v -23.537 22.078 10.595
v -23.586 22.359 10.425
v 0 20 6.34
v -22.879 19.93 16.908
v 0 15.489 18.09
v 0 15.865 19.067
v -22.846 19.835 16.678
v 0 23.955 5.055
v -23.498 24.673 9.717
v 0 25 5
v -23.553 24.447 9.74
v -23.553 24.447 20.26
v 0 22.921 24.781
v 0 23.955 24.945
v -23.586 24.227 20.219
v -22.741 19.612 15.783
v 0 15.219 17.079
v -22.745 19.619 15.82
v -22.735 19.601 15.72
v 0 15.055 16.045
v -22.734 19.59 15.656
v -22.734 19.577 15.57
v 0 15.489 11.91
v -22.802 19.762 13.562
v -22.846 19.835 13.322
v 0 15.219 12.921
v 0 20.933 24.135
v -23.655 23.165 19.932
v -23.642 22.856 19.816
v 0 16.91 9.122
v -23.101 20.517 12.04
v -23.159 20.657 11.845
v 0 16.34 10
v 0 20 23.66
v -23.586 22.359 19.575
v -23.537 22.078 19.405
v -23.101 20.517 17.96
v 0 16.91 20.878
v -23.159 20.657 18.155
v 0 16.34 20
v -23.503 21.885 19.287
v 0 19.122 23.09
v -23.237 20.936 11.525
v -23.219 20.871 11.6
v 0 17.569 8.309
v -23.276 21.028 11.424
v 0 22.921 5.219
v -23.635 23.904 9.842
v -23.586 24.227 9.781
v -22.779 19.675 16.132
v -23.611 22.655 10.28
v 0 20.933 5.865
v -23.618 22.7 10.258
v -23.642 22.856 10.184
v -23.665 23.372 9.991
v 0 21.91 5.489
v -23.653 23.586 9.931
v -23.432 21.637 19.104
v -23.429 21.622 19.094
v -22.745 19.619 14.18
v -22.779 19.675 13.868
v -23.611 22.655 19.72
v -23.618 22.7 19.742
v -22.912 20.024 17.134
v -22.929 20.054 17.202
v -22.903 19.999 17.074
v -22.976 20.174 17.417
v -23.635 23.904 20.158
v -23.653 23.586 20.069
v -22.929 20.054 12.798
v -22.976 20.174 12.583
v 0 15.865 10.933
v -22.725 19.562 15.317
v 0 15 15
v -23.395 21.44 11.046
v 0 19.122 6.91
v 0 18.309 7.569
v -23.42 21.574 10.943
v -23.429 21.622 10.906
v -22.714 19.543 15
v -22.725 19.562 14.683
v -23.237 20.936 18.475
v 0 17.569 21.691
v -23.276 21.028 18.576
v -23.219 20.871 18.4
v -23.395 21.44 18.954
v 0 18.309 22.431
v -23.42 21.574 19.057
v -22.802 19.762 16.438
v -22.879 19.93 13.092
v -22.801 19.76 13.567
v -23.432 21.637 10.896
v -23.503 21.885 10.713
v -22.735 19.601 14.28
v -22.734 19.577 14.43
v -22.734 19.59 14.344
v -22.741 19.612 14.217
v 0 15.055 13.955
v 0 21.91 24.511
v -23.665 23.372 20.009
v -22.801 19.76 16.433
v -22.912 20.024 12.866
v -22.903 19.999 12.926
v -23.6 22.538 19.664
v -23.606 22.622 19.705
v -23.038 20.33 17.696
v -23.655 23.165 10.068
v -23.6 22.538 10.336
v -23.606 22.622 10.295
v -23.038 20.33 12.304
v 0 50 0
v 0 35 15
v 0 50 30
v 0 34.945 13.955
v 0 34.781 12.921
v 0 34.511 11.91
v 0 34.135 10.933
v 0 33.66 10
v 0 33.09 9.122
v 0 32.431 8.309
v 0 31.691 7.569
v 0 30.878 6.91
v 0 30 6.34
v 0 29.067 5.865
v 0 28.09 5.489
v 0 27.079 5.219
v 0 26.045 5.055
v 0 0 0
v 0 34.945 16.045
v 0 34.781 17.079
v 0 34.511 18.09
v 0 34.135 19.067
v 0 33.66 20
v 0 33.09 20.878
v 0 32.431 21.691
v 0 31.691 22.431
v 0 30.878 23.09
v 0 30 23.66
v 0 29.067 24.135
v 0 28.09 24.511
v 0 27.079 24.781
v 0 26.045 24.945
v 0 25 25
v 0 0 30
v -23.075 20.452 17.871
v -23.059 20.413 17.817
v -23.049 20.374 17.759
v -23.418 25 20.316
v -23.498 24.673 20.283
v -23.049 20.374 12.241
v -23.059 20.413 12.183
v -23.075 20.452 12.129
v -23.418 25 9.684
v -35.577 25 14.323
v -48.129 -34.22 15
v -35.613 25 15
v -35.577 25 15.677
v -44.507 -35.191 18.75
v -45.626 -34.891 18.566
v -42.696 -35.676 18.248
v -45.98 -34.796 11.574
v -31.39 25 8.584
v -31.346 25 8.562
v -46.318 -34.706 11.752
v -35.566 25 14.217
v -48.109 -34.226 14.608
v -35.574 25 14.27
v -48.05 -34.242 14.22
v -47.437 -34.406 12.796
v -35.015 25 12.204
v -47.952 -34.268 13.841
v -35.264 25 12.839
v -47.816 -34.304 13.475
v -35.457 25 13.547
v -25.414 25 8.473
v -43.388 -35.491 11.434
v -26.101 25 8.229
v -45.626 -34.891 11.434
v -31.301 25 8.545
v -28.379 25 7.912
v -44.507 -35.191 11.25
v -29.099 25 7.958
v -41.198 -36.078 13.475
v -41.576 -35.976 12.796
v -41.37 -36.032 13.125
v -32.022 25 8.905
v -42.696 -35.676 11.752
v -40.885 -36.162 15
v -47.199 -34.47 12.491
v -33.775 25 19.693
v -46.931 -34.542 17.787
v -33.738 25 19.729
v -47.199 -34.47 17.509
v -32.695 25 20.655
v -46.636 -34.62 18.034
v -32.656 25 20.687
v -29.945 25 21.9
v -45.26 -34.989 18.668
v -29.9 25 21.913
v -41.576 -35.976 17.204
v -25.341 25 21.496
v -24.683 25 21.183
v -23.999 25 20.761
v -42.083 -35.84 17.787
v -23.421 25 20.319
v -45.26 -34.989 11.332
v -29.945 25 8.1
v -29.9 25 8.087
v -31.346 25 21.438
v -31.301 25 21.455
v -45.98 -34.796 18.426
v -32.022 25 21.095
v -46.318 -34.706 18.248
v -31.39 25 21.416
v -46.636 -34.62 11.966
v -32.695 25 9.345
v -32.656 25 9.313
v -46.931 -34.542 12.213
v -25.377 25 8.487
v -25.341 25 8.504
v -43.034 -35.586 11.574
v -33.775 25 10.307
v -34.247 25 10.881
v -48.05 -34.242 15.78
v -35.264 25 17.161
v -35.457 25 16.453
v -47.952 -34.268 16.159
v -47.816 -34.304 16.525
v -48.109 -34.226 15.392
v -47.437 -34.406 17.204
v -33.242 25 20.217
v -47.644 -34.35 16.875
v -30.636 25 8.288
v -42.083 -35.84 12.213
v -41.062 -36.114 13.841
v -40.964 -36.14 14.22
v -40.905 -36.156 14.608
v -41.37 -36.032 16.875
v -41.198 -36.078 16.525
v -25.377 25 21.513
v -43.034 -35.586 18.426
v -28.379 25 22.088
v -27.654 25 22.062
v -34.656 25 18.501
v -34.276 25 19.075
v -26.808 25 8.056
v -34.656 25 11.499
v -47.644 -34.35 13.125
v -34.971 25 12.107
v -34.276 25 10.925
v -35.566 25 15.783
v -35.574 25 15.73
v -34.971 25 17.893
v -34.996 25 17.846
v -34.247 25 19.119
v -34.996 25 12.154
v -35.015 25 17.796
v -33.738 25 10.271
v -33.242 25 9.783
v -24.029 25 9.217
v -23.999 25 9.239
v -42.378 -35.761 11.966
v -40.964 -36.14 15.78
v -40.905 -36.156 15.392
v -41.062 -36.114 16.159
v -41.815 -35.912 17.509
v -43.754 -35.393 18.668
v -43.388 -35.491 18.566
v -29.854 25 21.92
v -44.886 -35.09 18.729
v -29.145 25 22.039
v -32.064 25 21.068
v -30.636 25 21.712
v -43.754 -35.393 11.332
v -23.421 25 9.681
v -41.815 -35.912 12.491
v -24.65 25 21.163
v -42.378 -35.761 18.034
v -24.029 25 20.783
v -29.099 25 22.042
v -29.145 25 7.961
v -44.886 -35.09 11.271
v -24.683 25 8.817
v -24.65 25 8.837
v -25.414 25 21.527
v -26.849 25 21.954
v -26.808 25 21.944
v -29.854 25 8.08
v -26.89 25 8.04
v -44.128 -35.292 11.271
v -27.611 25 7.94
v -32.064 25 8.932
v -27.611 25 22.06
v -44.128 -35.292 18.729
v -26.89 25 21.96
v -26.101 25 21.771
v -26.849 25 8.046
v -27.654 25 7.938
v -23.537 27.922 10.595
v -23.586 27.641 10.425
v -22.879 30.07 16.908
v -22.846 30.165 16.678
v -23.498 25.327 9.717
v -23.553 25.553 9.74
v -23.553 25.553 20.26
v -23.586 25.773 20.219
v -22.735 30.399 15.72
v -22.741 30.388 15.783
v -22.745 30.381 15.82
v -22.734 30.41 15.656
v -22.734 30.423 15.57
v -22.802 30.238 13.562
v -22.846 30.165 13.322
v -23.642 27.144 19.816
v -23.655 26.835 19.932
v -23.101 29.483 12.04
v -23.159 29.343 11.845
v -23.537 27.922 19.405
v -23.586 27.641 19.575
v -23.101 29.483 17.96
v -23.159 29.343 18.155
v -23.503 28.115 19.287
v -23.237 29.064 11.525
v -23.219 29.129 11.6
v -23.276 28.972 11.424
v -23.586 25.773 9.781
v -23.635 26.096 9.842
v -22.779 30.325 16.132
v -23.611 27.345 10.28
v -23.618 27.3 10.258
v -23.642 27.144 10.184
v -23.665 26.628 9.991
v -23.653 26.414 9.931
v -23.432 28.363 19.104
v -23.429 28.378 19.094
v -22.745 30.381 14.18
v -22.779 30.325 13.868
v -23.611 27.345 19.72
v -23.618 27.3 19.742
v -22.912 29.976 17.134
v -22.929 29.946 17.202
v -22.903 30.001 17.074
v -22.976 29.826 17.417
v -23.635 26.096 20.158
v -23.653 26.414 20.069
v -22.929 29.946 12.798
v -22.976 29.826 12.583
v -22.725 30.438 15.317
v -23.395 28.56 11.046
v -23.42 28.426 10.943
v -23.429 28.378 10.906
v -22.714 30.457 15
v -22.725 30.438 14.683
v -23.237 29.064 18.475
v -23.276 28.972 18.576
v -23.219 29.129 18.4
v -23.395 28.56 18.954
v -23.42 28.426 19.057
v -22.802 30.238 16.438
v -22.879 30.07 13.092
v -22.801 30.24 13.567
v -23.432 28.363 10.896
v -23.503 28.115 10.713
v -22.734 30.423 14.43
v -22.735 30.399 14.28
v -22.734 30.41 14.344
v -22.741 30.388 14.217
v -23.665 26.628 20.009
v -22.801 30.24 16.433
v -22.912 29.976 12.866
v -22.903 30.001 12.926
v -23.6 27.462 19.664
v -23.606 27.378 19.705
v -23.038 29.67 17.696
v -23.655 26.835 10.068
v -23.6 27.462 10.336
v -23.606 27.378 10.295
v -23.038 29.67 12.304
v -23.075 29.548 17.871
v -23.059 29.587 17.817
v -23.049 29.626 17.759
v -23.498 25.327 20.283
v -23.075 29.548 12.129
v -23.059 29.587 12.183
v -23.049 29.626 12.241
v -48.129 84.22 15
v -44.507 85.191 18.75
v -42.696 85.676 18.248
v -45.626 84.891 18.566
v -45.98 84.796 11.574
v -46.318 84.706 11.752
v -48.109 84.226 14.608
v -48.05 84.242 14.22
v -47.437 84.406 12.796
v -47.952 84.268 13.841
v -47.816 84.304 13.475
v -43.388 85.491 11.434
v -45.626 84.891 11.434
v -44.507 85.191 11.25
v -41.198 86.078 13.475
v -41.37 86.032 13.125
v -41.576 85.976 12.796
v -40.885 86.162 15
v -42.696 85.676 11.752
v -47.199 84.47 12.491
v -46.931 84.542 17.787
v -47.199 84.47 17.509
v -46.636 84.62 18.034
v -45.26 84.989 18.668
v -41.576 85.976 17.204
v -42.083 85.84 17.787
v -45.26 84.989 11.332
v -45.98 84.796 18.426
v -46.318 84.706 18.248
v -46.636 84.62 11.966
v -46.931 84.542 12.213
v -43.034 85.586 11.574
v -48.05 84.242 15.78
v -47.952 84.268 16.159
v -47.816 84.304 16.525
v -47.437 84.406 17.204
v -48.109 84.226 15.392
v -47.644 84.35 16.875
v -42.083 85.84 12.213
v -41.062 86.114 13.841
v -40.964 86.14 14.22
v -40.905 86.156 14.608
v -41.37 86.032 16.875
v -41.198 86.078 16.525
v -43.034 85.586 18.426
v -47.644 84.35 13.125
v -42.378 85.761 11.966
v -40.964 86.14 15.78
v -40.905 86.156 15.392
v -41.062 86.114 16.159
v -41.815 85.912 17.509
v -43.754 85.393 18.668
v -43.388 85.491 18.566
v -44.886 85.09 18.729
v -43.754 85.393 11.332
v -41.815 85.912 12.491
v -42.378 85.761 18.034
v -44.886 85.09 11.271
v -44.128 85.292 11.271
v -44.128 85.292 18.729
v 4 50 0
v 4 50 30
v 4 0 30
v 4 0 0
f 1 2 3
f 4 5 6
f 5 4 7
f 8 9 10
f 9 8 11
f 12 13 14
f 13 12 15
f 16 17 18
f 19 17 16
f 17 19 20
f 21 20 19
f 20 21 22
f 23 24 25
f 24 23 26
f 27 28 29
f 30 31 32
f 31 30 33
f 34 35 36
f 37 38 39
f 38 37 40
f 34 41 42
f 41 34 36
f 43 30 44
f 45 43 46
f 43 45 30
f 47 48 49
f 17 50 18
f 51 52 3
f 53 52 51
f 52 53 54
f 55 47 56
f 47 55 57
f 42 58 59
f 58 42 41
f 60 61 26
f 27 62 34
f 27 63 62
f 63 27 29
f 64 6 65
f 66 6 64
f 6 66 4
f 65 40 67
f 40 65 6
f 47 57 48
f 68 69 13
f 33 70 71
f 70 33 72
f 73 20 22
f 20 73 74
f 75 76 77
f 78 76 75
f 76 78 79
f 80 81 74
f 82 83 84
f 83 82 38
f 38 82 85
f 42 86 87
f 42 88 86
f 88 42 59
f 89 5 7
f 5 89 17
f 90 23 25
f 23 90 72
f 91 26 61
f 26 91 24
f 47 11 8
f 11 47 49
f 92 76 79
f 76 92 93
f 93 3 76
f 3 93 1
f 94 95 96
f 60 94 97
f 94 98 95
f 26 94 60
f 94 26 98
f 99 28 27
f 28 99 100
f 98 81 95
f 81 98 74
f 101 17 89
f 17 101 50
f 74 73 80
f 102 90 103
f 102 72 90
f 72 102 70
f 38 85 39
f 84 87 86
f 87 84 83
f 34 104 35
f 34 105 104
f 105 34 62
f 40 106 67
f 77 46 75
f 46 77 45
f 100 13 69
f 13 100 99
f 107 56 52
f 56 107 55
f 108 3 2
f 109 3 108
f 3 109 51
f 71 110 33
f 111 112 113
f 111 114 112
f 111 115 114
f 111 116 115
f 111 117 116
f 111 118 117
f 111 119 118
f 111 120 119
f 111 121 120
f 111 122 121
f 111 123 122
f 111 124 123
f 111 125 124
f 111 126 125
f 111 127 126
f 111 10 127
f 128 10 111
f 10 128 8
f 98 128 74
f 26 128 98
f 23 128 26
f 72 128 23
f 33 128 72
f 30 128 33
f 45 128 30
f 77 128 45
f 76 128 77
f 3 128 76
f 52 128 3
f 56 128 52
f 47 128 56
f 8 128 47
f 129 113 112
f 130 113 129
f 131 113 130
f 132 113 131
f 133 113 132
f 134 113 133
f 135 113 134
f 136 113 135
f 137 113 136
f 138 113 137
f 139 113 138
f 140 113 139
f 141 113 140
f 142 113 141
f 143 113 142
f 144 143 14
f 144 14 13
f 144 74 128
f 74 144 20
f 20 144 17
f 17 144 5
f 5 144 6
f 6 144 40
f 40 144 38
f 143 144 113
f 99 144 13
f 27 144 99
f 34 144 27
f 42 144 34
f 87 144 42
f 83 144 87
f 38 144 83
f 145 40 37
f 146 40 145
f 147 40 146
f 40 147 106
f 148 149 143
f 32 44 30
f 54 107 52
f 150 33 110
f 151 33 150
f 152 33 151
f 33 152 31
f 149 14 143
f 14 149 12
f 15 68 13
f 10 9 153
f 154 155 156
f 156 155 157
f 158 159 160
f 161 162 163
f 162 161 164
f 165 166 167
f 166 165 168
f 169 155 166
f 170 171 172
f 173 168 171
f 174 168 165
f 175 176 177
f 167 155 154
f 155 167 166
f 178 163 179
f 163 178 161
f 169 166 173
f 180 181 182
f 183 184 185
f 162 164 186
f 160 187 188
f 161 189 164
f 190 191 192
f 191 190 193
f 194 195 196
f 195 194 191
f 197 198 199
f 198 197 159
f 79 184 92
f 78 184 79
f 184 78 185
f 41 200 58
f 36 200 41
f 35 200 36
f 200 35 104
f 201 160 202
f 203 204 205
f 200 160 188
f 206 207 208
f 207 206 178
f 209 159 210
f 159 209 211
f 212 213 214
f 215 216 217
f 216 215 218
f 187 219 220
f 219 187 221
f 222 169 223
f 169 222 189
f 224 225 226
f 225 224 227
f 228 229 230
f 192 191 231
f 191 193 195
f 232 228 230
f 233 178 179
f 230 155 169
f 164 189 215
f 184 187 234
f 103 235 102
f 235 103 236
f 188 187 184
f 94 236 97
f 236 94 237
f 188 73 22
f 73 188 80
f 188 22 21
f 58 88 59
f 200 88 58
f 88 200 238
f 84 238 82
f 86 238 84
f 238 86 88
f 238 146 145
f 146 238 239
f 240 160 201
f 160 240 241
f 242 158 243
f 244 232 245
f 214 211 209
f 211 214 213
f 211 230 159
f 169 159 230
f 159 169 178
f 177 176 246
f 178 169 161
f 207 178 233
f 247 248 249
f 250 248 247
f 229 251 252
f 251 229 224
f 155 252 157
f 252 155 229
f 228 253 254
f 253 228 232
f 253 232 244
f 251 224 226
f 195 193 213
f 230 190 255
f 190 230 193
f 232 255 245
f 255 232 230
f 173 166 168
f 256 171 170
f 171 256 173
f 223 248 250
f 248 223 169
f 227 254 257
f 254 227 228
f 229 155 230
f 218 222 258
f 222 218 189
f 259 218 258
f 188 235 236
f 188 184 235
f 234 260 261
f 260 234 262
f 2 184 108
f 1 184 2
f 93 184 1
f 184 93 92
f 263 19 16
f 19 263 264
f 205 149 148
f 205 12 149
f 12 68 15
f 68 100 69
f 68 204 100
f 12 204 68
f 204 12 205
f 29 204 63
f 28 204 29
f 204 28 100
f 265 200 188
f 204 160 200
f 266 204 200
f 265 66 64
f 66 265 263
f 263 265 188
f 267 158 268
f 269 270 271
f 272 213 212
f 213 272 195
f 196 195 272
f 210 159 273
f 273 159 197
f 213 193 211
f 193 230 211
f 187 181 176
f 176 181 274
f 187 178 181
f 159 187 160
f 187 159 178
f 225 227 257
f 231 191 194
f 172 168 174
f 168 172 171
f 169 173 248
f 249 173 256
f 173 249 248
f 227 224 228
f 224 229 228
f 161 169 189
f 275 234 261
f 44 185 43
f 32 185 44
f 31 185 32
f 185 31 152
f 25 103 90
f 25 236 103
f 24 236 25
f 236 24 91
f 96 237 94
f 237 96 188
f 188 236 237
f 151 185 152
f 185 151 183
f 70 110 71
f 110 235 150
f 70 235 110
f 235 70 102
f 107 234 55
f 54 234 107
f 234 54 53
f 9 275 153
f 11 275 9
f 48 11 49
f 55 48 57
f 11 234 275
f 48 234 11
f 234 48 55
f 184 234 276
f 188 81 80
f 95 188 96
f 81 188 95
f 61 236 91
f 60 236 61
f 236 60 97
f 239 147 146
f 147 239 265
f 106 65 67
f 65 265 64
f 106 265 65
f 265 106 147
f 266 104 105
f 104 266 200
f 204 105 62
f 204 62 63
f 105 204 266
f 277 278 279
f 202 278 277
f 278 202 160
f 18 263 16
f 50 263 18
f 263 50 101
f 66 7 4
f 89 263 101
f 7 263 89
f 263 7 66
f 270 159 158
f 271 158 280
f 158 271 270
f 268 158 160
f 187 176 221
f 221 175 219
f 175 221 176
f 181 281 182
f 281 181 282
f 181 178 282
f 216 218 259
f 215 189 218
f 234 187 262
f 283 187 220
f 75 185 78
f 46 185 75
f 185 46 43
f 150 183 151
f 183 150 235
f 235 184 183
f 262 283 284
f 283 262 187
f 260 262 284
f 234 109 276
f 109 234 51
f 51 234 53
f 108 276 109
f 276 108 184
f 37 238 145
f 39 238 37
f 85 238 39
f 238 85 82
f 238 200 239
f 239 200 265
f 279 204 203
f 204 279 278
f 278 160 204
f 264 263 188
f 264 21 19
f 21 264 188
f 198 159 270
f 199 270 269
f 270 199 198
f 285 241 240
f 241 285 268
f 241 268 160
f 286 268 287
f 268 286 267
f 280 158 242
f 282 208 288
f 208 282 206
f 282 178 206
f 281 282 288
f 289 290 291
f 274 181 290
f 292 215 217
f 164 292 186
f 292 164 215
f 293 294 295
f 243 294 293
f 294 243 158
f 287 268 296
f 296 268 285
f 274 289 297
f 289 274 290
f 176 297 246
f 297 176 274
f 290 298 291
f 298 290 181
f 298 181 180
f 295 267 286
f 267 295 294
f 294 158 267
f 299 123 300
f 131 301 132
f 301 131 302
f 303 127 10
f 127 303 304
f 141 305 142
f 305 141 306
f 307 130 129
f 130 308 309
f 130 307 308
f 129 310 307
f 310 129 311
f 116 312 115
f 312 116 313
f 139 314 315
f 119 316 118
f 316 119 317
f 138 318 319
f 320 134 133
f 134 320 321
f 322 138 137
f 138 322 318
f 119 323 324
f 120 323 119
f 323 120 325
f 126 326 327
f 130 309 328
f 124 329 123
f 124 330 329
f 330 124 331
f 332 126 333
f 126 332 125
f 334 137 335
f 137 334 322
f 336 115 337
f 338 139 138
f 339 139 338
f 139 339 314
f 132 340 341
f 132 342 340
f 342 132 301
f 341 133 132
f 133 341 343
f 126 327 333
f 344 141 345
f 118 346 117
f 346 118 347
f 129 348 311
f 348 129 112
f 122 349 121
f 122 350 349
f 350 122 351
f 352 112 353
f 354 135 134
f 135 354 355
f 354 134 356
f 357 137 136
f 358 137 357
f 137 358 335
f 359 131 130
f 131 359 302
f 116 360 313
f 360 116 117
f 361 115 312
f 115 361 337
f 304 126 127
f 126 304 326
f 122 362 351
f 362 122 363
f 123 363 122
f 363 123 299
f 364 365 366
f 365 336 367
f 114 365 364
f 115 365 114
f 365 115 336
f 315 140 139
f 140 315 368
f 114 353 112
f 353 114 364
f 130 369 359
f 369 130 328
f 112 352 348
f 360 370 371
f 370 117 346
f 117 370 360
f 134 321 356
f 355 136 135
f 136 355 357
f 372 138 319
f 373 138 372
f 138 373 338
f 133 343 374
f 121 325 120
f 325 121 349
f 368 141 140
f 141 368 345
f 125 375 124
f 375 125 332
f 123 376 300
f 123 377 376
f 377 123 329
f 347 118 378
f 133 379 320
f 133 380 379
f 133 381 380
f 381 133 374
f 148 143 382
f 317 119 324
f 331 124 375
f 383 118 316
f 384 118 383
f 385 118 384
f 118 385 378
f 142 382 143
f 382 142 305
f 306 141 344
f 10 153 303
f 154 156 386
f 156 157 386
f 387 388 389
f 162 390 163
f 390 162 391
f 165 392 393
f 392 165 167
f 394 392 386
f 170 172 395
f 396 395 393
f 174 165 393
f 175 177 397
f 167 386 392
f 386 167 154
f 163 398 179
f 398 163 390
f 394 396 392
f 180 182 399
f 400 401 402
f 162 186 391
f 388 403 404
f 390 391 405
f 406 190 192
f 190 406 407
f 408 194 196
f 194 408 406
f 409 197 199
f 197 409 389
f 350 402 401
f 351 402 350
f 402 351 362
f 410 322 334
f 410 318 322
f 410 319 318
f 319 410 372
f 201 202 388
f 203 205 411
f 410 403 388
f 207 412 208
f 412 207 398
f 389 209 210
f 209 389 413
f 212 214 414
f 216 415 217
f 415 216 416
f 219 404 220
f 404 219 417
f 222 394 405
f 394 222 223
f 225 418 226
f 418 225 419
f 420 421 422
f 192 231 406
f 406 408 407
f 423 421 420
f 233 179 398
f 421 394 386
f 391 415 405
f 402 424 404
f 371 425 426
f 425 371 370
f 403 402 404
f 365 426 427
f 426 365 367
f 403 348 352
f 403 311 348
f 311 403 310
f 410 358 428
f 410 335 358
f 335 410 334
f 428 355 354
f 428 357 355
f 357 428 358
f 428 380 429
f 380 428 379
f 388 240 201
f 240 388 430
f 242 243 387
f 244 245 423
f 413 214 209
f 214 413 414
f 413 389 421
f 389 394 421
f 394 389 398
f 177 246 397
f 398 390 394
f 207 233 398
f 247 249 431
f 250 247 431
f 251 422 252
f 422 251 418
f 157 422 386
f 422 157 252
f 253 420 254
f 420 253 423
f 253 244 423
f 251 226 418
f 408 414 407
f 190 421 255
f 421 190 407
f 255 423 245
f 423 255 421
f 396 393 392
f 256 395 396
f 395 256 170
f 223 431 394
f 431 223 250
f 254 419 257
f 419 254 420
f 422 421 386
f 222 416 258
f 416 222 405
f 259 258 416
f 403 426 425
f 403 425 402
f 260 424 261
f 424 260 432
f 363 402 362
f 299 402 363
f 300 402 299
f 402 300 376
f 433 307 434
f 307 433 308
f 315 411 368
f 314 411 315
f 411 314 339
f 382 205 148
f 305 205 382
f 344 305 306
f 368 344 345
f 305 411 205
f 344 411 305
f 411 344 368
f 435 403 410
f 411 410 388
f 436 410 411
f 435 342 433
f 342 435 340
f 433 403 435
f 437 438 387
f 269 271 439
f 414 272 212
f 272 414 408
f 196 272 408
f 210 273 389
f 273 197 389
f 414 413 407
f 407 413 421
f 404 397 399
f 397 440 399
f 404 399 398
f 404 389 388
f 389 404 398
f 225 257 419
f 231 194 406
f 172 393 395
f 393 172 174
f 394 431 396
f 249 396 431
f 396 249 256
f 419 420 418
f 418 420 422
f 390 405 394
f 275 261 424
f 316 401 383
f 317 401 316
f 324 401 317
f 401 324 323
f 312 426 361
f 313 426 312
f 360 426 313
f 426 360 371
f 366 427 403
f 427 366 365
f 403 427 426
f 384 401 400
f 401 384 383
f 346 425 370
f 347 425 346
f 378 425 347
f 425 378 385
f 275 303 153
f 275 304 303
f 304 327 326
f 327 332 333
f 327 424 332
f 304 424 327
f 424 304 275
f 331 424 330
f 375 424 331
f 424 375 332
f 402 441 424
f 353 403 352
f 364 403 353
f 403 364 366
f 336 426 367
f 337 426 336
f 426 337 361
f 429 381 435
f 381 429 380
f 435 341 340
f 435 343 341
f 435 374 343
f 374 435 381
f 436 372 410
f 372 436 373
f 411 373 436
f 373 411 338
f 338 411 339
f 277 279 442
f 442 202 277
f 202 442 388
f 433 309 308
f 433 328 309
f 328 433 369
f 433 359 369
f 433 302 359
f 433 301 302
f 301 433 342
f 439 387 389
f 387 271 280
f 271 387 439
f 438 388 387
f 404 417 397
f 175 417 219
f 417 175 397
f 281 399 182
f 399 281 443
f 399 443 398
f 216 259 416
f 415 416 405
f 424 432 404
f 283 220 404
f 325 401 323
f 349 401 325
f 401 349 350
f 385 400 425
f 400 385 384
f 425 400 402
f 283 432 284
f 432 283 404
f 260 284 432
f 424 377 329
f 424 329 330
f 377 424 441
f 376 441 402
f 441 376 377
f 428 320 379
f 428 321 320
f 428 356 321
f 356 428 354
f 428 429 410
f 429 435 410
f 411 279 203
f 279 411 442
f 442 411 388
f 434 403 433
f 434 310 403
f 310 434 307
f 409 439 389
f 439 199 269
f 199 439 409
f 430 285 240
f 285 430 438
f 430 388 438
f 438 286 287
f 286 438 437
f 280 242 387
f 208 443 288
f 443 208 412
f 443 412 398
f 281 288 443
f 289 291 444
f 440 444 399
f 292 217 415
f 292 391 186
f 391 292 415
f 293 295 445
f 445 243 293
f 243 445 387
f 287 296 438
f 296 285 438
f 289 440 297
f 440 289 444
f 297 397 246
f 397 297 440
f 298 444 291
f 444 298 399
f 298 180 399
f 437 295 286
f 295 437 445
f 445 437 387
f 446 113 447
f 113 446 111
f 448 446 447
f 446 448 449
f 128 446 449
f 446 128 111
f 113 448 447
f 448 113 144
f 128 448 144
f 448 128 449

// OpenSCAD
$fn=60;

module bracket_panel(width, length, thickness, screw_position) {


    difference() {
        linear_extrude(thickness) {
            square([width, length]);
        }

        if (screw_position != undef) {
            union() {
                translate([screw_position[0], screw_position[1],0])
                rotate([0,0,90]) {
                    linear_extrude(thickness * 5, center=true)
                    circle(3);
                }

                //mirrors the above
                translate([width - screw_position[0], length - screw_position[1],0])
                rotate([0,0,90]) {
                    linear_extrude(thickness * 5, center=true)
                    circle(3);
                }
            }
        }
    }
}

module half_handle() {
    rotate([-90,0,90])
    difference() {
        translate ([-10,0,0]) {
        
            translate([10,0,0])
            linear_extrude(30, scale=0.4) circle(10);

            rotate([0, -75, 0])
            translate([30,0,-10])
            linear_extrude(70, scale=0.5) circle(7.5);
        }

        translate([0,-15,0]) cube([30,30,60]);
    }
}

module handle() {
    half_handle();
    mirror([0,1,0]) half_handle();
}

thickness=3;
width=50;
length=50;

//bracket_panel(width, length, thickness, [2/5 * width, 1/5 * length]);

translate([4,0,0])
rotate([0,-90,0]) {
    bracket_panel(30, length, 4);
}

offset=[0,25,15];
translate(offset) handle();
